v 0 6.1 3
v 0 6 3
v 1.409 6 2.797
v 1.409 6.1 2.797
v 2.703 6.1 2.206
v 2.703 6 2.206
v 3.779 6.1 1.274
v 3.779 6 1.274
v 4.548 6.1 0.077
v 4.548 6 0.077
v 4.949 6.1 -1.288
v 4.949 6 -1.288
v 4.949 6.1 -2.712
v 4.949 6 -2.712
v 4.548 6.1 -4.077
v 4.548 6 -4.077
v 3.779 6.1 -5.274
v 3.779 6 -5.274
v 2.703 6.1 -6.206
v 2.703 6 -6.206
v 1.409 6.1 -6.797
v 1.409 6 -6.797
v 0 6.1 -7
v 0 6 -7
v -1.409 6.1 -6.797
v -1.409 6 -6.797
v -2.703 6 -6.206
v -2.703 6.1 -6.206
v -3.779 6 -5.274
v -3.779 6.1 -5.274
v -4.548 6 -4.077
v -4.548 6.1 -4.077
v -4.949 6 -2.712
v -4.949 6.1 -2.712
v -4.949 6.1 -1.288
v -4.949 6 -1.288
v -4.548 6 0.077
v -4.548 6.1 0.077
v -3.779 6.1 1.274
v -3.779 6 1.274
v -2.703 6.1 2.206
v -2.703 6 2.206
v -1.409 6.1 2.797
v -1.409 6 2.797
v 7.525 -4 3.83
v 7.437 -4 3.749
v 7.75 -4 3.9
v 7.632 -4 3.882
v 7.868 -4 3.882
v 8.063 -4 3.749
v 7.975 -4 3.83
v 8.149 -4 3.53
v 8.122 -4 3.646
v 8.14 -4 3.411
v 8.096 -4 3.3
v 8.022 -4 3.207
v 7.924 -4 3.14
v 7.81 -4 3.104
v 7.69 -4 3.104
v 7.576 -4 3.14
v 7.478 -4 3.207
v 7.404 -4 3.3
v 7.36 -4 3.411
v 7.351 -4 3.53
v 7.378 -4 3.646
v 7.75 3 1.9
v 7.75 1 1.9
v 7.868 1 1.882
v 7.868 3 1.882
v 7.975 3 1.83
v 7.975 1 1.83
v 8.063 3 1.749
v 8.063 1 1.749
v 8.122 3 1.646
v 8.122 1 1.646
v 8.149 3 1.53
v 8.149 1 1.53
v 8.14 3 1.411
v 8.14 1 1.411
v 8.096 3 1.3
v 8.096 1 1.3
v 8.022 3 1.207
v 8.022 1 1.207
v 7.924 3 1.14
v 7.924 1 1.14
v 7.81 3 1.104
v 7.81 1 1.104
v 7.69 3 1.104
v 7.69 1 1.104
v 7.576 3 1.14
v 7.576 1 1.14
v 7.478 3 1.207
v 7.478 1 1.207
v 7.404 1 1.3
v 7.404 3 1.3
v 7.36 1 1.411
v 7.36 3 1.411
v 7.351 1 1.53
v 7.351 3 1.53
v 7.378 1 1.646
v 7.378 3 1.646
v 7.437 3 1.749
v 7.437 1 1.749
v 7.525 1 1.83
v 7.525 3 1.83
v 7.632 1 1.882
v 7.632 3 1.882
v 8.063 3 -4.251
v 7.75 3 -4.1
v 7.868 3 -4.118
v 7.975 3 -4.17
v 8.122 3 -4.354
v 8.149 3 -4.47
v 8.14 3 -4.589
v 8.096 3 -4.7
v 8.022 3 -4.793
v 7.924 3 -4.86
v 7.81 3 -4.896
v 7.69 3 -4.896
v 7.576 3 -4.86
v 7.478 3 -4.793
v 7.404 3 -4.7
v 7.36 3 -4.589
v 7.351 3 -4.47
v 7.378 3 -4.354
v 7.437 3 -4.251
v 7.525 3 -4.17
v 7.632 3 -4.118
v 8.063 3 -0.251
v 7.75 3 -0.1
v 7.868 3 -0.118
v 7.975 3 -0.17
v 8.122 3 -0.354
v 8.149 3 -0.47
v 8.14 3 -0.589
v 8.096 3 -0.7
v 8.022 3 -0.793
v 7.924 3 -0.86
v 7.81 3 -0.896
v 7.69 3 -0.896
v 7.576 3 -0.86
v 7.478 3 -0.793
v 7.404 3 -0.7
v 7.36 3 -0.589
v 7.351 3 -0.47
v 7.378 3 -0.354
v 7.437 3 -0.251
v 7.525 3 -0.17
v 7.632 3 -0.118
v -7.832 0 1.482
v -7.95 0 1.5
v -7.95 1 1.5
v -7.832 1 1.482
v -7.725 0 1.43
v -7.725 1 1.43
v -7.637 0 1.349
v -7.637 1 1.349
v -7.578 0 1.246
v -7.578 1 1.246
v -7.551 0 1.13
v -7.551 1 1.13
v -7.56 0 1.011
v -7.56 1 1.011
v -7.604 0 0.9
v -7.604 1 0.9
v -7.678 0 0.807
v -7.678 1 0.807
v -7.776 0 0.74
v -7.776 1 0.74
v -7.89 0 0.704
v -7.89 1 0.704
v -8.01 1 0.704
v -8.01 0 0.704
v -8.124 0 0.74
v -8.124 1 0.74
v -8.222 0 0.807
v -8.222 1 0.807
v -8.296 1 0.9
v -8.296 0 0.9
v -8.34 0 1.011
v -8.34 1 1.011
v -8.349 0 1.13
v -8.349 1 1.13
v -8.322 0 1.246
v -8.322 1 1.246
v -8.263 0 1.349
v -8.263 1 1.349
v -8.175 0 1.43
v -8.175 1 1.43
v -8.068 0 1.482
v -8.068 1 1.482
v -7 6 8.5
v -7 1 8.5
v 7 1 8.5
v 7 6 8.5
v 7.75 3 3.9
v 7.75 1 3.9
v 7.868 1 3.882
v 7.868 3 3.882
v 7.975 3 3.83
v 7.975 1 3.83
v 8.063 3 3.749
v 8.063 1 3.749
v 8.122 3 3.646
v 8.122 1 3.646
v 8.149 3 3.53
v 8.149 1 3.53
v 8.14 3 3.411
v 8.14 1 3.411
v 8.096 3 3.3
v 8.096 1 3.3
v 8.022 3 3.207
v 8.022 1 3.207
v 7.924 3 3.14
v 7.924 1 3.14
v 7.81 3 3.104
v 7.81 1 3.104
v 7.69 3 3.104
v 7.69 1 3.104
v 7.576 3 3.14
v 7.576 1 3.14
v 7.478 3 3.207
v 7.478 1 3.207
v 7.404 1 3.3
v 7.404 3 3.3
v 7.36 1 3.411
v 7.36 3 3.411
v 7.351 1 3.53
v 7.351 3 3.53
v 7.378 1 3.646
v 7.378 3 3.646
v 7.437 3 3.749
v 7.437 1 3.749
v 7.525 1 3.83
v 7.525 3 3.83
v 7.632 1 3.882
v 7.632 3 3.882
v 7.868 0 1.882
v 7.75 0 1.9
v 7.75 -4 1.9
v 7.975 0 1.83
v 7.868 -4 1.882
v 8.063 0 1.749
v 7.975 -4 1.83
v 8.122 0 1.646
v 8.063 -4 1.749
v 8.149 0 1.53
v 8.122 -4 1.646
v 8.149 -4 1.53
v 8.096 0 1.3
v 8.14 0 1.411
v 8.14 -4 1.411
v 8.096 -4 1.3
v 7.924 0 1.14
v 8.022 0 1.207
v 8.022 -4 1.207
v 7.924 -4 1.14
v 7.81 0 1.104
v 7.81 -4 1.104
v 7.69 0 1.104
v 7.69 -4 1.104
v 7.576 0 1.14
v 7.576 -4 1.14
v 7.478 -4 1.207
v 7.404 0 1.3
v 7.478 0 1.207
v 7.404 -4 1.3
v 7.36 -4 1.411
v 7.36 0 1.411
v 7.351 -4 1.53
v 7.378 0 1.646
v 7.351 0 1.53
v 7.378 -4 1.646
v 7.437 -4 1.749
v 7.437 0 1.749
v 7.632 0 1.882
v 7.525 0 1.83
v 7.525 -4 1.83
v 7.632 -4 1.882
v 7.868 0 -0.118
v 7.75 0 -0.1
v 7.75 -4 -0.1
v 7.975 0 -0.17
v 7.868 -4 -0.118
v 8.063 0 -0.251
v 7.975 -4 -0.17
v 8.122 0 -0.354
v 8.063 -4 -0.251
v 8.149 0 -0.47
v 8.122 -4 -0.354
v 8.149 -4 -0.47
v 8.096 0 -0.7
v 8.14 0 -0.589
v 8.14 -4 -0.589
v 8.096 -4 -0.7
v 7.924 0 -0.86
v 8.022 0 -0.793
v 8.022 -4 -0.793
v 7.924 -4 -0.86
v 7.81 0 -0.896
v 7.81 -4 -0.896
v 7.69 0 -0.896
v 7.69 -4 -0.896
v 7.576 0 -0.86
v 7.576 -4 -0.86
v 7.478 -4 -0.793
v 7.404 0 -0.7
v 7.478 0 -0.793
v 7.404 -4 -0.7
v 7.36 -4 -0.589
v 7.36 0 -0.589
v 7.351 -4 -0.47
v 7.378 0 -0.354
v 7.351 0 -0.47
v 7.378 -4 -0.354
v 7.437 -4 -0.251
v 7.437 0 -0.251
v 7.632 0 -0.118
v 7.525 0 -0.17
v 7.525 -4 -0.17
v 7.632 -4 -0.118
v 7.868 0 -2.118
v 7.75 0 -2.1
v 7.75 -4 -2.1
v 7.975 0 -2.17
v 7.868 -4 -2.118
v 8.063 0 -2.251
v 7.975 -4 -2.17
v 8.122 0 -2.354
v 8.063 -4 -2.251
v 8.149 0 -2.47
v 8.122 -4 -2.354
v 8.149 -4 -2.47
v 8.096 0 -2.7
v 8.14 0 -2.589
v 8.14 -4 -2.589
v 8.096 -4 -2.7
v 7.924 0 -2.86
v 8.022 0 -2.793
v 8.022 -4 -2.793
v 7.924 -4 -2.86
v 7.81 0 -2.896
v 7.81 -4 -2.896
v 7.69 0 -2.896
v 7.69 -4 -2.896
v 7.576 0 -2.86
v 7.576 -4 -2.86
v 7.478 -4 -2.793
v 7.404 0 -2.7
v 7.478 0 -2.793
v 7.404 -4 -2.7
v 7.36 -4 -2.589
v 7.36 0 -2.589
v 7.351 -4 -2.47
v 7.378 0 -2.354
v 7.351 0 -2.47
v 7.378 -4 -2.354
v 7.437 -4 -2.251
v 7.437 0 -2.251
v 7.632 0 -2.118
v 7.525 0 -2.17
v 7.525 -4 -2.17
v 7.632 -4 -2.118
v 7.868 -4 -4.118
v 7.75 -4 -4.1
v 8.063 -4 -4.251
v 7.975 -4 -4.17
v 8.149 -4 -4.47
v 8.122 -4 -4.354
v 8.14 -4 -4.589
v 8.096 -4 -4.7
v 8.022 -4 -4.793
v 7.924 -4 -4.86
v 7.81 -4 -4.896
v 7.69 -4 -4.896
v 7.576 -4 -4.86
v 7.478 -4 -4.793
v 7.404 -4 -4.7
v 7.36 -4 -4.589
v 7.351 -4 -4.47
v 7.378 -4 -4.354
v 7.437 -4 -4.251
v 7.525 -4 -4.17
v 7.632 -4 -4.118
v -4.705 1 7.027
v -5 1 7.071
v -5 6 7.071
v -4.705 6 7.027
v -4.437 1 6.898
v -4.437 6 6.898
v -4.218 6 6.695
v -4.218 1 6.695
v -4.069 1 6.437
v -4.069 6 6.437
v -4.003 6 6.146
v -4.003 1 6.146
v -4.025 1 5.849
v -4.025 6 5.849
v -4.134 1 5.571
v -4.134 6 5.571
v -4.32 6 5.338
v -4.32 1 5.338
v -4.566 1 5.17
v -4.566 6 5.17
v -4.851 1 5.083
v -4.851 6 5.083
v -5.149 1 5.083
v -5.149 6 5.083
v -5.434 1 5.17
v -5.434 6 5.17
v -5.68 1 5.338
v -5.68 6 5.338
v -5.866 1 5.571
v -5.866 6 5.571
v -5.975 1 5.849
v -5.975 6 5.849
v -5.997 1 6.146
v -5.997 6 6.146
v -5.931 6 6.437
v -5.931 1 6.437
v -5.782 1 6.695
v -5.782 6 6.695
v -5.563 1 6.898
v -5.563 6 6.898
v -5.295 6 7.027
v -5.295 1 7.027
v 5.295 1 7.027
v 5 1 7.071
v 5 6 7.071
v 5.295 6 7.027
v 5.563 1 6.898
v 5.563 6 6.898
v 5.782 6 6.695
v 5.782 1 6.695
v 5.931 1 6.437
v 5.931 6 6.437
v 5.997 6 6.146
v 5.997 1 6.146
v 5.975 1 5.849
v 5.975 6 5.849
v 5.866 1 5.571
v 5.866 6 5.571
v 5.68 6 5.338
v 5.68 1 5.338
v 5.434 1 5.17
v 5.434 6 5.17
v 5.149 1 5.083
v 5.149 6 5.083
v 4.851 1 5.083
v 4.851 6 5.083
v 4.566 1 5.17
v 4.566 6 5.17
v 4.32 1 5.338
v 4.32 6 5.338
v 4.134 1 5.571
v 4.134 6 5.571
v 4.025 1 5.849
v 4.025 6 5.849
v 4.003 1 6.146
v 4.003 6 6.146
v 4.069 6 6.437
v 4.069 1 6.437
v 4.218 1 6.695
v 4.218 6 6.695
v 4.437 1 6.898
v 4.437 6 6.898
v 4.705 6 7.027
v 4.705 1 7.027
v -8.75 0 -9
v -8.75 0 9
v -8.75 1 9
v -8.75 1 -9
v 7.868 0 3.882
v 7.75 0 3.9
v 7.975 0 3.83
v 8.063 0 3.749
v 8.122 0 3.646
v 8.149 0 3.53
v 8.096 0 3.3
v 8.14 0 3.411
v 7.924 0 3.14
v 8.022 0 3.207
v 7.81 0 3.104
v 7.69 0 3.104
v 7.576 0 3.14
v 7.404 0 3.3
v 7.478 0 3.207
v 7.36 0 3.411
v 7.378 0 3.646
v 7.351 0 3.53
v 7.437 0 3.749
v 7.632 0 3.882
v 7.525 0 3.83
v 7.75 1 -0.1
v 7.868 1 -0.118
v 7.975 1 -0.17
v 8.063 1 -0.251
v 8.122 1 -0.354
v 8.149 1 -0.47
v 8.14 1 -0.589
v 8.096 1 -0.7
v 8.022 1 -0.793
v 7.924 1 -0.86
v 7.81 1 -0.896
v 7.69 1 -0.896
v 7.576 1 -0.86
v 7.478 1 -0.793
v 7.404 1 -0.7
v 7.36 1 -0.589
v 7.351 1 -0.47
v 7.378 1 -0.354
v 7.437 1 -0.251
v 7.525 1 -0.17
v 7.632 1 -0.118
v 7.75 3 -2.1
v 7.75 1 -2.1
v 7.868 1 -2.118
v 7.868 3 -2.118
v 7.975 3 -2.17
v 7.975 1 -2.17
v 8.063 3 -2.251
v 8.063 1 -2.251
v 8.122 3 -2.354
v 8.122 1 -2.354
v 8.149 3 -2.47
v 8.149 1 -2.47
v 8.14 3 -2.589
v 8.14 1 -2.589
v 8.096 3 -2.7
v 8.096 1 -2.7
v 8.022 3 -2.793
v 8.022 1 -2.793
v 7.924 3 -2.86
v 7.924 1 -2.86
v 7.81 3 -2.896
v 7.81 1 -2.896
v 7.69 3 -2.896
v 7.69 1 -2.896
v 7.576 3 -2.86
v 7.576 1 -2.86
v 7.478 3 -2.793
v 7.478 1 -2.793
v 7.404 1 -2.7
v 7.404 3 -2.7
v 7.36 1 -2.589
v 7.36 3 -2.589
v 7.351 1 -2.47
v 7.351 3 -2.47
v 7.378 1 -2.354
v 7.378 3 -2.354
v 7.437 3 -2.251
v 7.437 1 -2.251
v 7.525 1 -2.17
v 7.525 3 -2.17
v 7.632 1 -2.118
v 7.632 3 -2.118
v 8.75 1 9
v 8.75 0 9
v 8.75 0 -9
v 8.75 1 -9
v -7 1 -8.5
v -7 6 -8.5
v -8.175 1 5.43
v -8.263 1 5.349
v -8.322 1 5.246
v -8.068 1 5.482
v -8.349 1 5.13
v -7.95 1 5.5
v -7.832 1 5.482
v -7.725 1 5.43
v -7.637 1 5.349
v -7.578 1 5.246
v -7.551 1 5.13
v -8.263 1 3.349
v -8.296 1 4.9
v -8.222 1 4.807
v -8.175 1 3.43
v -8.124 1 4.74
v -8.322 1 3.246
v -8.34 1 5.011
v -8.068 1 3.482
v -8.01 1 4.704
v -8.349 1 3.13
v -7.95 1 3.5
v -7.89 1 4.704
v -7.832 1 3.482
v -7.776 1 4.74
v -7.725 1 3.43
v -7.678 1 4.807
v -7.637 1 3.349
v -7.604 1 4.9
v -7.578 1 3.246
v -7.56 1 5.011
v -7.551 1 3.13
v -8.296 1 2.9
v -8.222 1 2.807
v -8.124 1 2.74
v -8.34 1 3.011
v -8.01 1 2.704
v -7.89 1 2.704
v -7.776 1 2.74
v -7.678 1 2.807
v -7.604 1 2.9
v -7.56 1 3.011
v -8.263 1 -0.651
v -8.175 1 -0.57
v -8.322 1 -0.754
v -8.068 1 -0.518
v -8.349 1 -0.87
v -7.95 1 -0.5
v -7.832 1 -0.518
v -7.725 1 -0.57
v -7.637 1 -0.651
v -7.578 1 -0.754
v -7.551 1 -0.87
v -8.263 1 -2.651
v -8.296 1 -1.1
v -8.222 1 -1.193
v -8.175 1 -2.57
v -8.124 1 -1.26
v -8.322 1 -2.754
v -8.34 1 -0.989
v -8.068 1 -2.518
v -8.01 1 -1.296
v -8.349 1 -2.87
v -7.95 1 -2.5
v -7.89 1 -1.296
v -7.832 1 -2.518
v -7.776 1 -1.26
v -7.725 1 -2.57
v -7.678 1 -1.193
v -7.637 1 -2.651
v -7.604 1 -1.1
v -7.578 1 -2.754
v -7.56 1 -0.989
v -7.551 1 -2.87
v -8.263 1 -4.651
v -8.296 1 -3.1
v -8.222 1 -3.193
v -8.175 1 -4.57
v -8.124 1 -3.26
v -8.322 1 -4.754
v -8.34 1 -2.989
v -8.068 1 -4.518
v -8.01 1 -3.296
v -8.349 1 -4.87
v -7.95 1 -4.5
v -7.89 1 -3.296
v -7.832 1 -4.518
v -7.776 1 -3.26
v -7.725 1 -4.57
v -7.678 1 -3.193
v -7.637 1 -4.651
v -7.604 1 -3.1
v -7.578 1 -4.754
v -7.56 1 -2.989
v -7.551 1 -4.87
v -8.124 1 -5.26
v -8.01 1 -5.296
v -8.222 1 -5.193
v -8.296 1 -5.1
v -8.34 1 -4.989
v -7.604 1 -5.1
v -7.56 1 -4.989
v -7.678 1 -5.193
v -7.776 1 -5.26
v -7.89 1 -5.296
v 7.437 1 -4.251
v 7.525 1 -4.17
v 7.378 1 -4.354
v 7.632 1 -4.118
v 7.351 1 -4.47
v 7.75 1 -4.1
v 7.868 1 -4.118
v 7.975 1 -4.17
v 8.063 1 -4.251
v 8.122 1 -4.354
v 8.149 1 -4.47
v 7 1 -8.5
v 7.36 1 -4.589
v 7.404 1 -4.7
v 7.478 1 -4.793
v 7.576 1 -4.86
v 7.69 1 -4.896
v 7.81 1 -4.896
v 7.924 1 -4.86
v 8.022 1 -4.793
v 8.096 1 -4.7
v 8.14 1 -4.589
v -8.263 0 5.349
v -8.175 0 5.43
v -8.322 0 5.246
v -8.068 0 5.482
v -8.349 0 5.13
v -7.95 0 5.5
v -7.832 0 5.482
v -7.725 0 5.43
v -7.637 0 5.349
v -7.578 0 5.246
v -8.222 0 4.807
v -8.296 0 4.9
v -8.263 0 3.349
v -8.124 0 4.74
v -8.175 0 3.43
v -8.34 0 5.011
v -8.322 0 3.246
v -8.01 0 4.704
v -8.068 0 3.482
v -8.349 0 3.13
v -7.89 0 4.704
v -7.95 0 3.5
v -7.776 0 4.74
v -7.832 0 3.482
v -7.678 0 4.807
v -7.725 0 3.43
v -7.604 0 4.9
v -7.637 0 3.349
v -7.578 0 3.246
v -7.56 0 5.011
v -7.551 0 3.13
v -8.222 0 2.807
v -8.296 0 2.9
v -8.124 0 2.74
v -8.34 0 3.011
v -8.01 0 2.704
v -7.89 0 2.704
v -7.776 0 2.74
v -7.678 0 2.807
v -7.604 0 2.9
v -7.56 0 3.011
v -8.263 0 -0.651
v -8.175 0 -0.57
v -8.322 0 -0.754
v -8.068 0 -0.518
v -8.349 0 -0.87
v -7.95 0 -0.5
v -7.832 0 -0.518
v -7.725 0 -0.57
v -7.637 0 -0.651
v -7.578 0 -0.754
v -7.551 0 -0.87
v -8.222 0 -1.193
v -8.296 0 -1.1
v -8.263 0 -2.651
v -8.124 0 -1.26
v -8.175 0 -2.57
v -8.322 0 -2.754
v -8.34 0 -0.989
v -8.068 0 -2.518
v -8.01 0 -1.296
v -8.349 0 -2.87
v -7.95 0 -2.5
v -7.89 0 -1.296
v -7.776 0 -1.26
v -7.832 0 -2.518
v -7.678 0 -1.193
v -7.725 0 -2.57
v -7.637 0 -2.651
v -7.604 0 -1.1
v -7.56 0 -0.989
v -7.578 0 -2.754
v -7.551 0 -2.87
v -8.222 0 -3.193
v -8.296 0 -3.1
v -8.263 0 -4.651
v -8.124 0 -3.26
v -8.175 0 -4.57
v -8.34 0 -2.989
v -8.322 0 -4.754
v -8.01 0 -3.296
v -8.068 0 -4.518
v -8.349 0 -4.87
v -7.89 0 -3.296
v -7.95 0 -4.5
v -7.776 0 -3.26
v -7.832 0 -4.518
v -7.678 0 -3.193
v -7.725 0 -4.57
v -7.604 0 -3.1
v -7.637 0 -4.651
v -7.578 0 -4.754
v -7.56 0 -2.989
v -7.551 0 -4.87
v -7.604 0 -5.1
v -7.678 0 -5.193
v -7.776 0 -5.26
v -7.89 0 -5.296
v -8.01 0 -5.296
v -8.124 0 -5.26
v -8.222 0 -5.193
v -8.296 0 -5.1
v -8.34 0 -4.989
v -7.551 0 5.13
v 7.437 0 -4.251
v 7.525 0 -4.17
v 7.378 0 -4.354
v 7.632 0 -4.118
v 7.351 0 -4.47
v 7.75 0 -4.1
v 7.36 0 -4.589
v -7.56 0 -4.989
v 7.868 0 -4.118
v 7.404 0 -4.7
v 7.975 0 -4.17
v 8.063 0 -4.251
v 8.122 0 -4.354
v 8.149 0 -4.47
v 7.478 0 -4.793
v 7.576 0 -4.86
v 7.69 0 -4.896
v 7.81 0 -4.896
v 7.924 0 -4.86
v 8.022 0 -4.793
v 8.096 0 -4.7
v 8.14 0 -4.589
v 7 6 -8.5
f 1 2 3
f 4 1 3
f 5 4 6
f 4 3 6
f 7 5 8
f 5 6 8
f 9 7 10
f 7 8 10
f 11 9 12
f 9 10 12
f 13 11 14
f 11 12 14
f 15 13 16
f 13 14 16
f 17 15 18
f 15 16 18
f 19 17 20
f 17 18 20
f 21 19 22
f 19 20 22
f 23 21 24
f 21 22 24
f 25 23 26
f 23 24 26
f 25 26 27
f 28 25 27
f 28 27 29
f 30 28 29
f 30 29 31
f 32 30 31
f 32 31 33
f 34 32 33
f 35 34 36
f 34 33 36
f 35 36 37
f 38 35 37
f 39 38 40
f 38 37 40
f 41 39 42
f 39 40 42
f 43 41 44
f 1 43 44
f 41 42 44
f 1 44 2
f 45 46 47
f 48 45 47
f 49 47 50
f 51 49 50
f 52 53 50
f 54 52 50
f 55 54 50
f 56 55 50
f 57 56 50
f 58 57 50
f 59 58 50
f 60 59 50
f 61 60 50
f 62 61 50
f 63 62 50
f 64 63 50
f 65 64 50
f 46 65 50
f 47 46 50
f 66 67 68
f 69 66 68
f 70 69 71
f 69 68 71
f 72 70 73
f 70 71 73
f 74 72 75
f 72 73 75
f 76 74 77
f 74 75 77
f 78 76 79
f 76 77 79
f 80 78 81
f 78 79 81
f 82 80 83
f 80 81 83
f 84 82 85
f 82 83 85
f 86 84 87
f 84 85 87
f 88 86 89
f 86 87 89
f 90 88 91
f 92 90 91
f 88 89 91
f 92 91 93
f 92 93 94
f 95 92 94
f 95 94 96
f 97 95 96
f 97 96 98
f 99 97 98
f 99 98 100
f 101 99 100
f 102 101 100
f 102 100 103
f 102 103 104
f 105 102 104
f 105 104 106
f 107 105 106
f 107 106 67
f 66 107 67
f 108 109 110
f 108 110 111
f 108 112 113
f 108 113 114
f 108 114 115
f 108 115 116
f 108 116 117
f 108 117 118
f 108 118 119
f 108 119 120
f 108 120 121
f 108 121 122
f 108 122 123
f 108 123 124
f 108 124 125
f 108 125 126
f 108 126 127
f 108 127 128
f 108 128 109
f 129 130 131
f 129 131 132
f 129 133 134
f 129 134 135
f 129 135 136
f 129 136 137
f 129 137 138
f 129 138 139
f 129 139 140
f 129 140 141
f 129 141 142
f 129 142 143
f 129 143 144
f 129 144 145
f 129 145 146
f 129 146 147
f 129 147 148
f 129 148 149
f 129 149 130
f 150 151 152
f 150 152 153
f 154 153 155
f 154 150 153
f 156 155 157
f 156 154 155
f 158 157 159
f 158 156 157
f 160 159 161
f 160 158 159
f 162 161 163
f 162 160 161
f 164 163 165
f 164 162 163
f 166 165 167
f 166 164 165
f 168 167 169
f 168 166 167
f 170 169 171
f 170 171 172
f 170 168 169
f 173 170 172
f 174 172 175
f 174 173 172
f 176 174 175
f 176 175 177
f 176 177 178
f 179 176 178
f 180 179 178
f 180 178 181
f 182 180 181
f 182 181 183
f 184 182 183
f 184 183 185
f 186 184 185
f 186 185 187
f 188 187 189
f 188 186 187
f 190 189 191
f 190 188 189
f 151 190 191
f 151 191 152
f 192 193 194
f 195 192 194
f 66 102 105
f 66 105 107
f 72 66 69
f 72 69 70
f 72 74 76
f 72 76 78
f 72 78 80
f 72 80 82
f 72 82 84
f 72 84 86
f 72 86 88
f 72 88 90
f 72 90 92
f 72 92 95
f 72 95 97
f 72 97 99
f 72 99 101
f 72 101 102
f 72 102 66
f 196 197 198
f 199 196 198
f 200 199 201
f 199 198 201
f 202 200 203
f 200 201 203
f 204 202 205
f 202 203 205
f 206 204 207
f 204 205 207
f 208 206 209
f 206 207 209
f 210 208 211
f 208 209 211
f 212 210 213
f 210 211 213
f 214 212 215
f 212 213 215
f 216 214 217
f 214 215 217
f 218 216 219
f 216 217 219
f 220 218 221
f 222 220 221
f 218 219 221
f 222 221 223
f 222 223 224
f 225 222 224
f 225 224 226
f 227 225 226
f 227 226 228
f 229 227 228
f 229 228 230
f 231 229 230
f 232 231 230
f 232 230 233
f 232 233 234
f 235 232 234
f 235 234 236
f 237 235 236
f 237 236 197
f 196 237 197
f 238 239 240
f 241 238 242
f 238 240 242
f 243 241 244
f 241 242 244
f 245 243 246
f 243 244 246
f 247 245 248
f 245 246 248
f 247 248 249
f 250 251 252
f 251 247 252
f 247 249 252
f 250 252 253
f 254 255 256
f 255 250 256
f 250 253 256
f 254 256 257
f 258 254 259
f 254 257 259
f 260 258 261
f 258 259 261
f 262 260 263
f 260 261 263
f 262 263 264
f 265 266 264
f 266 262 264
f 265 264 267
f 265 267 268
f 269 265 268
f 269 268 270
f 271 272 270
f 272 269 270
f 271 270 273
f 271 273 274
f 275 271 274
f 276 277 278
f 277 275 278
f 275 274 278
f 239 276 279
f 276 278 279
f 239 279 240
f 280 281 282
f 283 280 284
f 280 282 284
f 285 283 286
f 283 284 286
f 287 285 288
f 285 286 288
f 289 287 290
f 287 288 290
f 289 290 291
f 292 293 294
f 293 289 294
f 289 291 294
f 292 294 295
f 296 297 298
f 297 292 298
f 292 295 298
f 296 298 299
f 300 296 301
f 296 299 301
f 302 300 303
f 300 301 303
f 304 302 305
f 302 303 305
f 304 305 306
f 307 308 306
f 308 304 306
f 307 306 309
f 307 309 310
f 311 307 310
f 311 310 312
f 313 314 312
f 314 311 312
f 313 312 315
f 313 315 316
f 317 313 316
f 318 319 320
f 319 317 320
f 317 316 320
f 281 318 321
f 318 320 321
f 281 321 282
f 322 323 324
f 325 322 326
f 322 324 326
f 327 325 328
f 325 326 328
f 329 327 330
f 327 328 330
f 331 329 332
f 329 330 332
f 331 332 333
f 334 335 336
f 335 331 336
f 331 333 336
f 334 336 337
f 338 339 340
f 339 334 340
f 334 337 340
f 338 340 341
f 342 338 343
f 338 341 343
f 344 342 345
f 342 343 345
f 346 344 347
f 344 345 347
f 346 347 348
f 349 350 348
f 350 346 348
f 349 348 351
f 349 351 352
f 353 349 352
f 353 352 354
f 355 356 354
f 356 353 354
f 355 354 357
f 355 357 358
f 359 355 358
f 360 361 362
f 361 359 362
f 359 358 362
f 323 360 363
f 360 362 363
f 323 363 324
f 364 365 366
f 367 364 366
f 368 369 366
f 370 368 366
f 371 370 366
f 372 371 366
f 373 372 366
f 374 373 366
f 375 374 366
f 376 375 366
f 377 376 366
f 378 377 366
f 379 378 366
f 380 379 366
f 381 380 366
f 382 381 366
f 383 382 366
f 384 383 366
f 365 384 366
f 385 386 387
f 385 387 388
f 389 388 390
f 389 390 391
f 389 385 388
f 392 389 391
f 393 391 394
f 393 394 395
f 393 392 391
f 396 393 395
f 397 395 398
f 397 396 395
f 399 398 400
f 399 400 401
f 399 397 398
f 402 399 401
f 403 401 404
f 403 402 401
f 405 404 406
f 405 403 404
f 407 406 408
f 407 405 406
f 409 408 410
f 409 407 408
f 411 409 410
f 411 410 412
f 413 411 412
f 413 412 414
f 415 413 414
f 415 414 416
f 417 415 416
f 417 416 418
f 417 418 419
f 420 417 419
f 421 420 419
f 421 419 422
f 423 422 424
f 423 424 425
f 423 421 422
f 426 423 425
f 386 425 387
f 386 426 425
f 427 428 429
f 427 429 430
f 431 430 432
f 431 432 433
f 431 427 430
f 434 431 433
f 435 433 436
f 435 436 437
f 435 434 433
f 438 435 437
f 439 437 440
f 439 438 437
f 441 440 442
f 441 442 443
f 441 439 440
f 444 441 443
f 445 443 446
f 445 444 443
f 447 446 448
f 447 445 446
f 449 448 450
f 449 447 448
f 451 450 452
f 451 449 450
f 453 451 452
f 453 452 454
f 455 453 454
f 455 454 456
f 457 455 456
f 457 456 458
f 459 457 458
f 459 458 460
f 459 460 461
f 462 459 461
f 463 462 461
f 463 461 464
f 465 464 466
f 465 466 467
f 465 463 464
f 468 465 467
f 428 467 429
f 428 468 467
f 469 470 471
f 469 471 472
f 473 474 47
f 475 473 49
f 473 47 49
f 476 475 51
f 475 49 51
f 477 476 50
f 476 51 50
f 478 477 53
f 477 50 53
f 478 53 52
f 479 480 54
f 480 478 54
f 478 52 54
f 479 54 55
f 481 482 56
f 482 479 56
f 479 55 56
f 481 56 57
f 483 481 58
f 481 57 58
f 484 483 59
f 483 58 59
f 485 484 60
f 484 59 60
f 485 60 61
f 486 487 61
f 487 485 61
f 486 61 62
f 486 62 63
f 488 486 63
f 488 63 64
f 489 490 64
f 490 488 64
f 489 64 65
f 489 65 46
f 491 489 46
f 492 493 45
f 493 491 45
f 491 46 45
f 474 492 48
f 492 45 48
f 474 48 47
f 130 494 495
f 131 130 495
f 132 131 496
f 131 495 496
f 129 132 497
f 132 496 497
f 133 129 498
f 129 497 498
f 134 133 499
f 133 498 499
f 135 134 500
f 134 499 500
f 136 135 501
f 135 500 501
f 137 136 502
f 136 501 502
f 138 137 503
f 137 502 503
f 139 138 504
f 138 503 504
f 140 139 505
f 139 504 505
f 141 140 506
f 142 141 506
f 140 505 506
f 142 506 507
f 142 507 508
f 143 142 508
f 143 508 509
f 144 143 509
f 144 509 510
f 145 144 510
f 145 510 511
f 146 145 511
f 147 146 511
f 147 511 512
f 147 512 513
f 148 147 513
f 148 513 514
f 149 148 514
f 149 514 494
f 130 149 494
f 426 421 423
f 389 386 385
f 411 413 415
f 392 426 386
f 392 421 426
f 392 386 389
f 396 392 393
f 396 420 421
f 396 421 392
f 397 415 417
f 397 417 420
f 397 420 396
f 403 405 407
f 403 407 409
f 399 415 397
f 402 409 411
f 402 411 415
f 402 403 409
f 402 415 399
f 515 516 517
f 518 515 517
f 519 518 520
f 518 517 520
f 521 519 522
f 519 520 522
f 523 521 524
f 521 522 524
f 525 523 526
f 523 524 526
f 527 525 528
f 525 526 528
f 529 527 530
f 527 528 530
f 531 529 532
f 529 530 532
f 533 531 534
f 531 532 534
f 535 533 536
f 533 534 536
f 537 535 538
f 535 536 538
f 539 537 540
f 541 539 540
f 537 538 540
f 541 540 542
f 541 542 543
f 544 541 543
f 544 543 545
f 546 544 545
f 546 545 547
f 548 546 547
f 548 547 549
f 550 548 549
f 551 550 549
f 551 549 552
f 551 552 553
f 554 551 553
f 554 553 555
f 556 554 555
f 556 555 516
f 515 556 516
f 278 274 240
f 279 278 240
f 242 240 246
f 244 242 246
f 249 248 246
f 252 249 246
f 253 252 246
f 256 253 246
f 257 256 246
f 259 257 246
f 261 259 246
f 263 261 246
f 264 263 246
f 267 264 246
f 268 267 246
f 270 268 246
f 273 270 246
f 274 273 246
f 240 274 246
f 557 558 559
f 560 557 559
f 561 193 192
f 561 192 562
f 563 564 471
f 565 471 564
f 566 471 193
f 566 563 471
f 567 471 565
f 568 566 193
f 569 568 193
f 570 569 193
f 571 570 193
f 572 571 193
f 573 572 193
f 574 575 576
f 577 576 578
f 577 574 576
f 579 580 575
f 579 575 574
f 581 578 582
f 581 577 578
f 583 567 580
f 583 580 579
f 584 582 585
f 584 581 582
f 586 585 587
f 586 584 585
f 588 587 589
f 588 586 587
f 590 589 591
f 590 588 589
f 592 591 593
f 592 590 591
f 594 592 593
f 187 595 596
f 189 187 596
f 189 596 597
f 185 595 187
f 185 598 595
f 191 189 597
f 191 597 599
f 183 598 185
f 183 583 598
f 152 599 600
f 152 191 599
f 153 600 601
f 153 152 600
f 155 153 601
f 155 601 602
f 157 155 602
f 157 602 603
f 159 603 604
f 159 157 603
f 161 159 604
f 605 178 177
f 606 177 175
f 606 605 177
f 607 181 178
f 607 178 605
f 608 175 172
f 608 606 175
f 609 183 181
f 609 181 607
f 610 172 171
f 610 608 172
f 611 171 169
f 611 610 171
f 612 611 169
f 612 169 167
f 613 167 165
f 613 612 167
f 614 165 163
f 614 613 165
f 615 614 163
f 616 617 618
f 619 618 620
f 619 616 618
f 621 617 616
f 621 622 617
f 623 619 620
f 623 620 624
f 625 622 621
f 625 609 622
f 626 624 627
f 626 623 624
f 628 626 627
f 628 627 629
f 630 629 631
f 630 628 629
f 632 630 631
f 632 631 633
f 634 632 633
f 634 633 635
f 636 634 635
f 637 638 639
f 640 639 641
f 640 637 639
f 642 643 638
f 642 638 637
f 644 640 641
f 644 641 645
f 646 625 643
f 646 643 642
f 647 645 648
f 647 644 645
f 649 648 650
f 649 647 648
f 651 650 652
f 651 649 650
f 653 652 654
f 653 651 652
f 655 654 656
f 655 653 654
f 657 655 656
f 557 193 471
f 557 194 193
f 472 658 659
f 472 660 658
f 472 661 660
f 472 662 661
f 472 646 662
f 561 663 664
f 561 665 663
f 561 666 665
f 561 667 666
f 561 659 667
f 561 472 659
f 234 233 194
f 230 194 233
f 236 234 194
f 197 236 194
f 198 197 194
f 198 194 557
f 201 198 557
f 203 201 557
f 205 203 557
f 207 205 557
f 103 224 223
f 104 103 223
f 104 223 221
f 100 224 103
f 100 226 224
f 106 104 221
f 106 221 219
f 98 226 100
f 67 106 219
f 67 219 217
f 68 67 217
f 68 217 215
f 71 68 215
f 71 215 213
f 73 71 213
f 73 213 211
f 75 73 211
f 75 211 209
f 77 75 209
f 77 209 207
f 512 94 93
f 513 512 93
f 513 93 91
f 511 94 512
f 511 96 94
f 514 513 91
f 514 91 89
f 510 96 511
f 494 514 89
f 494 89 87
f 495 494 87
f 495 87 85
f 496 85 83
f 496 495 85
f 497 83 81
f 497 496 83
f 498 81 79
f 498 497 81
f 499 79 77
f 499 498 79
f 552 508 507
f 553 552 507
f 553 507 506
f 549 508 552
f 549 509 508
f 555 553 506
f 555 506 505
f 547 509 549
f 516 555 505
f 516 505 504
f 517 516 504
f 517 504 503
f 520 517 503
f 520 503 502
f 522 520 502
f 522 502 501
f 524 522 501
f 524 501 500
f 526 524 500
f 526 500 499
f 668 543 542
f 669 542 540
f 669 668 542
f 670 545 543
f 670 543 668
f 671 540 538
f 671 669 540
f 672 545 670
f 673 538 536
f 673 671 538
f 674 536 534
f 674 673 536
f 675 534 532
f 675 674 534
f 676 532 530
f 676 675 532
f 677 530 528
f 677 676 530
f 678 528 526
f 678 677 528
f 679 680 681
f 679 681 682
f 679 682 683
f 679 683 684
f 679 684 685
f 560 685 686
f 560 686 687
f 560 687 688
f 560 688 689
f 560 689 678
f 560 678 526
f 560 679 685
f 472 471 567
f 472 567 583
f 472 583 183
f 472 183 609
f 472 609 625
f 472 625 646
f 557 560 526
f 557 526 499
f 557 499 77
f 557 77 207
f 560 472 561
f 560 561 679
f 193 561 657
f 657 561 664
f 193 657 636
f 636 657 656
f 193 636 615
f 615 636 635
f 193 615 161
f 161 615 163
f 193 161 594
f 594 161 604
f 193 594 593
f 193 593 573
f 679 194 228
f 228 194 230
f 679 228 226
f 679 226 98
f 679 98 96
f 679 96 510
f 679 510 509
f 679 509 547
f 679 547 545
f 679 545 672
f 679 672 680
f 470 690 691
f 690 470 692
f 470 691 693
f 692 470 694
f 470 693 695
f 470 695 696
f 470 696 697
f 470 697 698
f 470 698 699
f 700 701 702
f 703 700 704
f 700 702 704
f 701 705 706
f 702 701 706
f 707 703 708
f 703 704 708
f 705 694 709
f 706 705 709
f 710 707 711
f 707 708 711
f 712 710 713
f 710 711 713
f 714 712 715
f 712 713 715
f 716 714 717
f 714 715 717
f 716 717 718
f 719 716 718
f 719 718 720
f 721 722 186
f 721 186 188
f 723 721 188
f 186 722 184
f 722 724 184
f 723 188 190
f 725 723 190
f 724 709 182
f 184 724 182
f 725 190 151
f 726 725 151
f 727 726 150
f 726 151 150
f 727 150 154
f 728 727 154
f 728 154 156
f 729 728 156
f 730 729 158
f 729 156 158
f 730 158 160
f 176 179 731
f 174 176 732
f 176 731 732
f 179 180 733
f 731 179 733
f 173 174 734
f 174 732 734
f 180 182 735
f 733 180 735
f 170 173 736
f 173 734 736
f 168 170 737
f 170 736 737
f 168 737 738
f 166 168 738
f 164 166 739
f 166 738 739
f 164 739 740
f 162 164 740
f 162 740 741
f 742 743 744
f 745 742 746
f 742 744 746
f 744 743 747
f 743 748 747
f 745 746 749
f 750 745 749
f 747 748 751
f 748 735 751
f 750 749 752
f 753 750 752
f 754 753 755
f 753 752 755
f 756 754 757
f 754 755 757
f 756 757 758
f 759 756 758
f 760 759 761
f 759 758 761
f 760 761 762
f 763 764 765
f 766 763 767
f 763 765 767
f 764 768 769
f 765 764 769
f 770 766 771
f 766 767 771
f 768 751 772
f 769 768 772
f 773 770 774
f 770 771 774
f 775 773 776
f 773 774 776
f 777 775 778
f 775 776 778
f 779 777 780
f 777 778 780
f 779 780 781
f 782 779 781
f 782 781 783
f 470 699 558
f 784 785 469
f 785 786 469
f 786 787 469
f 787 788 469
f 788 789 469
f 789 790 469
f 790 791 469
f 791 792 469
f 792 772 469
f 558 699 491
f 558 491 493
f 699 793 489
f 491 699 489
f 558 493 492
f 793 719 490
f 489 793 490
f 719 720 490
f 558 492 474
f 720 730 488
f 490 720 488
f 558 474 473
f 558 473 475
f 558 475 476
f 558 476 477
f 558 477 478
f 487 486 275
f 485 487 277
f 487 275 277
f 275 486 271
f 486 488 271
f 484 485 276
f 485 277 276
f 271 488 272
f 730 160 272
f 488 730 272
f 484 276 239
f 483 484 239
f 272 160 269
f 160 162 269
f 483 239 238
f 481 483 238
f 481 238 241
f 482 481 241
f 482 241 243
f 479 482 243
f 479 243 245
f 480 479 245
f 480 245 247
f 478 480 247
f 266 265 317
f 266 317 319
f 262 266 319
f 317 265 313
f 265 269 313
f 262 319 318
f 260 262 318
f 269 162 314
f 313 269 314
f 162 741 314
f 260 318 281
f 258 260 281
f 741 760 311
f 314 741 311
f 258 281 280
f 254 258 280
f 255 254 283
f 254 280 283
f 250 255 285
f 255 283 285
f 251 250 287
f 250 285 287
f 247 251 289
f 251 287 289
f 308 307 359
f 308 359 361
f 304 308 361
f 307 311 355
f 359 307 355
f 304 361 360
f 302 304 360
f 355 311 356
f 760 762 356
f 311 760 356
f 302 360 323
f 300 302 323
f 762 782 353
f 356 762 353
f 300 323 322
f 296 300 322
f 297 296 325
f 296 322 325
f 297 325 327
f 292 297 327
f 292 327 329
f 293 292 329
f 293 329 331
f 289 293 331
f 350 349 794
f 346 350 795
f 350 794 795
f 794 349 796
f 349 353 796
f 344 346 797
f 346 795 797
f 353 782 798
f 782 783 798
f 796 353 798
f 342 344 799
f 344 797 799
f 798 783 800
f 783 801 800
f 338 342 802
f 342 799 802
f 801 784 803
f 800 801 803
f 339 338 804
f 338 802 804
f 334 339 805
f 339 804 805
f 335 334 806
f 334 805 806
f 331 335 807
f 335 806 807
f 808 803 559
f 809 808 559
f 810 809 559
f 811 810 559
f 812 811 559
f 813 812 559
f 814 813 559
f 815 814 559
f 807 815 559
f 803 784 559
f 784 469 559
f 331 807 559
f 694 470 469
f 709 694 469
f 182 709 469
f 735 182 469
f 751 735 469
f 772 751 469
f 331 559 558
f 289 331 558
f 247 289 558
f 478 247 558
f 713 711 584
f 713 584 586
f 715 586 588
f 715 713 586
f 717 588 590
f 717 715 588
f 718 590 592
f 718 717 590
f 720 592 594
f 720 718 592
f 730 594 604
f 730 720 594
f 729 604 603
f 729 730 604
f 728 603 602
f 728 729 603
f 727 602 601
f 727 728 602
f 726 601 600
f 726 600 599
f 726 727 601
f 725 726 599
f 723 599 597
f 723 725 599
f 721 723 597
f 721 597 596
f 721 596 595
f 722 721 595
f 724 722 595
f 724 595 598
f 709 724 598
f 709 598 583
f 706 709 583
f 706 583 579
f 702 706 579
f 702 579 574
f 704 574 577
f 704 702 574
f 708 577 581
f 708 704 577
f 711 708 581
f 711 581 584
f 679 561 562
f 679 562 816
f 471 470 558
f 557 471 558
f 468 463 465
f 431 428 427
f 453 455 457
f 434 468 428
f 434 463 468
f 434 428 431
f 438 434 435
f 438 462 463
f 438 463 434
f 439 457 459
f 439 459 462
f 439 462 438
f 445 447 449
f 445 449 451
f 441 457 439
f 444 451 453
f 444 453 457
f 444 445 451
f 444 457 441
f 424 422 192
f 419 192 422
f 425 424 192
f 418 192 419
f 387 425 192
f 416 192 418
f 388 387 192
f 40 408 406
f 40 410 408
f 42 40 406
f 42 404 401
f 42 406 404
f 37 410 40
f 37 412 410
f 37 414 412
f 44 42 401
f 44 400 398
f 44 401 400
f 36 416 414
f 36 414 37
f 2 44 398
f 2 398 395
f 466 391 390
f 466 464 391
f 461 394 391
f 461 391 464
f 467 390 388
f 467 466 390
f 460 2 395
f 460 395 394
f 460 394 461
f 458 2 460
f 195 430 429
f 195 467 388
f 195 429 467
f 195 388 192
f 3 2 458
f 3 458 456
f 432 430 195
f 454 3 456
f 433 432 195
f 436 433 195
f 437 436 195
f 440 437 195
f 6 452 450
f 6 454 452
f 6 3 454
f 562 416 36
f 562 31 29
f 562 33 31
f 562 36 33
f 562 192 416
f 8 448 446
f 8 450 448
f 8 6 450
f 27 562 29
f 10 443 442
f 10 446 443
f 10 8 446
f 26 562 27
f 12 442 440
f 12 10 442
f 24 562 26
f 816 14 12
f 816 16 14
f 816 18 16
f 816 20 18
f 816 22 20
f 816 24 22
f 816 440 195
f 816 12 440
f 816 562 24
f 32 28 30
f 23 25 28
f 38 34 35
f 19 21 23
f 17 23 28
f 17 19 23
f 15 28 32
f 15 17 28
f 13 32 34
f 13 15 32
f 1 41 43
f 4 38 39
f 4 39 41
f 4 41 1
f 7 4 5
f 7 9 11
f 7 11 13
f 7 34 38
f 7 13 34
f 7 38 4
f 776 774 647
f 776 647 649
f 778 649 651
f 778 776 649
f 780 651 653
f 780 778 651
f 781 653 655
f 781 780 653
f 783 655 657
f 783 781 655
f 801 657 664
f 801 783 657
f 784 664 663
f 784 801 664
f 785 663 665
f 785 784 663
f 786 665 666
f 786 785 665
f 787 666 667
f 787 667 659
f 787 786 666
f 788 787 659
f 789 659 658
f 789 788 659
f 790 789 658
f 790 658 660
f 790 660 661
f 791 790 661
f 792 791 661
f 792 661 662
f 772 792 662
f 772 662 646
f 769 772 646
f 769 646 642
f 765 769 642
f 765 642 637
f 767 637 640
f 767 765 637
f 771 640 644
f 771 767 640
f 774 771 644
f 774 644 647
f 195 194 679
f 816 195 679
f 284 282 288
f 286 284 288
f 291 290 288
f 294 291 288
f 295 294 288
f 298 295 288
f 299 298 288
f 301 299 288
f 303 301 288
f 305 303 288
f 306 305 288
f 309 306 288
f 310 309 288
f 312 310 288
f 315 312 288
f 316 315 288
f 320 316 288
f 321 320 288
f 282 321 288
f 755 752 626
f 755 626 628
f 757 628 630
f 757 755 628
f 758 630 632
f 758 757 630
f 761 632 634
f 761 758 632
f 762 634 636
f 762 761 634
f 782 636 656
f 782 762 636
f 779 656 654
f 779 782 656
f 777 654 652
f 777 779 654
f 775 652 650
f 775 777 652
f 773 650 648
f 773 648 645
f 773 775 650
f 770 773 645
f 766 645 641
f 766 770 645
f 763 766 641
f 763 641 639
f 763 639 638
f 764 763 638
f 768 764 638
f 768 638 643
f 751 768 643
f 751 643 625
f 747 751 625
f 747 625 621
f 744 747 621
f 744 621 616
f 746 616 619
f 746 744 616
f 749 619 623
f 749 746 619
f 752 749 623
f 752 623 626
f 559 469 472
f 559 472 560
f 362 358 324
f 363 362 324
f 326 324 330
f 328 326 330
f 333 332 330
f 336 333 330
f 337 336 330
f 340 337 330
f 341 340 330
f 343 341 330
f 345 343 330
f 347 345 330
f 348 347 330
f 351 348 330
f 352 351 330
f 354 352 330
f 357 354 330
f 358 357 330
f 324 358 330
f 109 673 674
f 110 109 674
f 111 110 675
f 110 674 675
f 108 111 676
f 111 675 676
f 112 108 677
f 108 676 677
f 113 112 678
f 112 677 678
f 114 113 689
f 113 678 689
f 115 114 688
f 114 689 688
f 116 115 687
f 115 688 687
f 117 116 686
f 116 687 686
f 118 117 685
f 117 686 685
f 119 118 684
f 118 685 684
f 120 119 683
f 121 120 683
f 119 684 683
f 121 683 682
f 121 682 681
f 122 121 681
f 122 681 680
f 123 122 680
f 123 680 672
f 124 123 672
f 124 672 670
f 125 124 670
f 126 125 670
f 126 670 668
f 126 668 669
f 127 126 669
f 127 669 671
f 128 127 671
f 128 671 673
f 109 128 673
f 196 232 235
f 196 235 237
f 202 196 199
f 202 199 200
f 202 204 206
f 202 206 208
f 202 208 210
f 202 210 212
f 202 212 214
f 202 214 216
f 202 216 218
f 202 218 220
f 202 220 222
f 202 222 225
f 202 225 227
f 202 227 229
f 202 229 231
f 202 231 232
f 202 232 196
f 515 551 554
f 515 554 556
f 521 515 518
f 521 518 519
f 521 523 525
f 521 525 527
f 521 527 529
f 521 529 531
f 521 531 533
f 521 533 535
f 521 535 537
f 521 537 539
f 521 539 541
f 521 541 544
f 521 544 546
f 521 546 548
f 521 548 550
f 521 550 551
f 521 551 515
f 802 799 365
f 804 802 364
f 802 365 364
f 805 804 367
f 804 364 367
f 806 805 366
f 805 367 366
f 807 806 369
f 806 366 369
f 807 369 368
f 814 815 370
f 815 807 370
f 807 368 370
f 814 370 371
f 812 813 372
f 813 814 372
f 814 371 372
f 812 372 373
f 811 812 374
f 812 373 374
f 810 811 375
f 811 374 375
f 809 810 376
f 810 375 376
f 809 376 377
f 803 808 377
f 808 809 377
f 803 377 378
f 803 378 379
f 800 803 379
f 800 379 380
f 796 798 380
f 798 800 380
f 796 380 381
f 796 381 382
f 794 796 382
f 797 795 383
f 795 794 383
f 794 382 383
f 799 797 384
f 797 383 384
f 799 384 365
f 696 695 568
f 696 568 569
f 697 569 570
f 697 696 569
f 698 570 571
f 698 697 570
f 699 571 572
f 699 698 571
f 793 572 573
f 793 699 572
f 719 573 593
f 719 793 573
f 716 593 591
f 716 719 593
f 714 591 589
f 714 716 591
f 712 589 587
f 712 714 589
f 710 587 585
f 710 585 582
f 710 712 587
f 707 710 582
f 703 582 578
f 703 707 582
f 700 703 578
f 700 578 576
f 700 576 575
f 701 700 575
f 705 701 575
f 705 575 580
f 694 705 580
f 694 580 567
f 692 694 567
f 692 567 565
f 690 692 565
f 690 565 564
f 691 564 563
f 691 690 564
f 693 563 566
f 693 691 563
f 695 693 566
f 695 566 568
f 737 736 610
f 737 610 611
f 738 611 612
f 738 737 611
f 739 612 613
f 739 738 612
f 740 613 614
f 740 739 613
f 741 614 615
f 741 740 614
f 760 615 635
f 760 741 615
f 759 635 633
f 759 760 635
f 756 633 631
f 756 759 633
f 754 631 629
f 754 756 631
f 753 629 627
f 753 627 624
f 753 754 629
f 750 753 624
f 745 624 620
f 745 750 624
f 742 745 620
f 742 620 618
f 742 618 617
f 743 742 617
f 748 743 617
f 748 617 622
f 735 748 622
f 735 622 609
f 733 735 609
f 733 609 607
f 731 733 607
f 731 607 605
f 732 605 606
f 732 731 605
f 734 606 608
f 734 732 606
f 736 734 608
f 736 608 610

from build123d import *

# Parameters (mm, degrees)
SKETCH1_W                = 17.5
SKETCH1_H                = 18
SKETCH1_R                = 0.4
BOSS_EXTRUDE1_DEPTH      = 1
SKETCH3_W                = 14
SKETCH3_H                = 17
SKETCH3_R                = 1
BOSS_EXTRUDE2_DEPTH      = 5
BOSS_EXTRUDE3_DEPTH      = 2
BOSS_EXTRUDE3_DEPTH_BACK = 5
SKETCH4_R                = 0.4
SKETCH5_R                = 5
BOSS_EXTRUDE4_DEPTH      = 0.1


with BuildPart() as part:
    # Sketch1 → Boss-Extrude1 (new body)
    with BuildSketch(Plane(origin=(0, 0, 0), x_dir=(1, 0, 0), z_dir=(0, 1, 0))):
        Rectangle(SKETCH1_W, SKETCH1_H)
        with Locations(Location((-7.95, -5.1, 0), (0, 0, 270))):
            Circle(SKETCH1_R, mode=Mode.SUBTRACT)
        with Locations(Location((-7.95, -3.1, 0), (0, 0, 270))):
            Circle(SKETCH1_R, mode=Mode.SUBTRACT)
        with Locations(Location((-7.95, -1.1, 0), (0, 0, 270))):
            Circle(SKETCH1_R, mode=Mode.SUBTRACT)
        with Locations(Location((-7.95, 0.9, 0), (0, 0, 270))):
            Circle(SKETCH1_R, mode=Mode.SUBTRACT)
        with Locations(Location((-7.95, 2.9, 0), (0, 0, 270))):
            Circle(SKETCH1_R, mode=Mode.SUBTRACT)
        with Locations(Location((-7.95, 4.9, 0), (0, 0, 270))):
            Circle(SKETCH1_R, mode=Mode.SUBTRACT)
    extrude(amount=BOSS_EXTRUDE1_DEPTH)

    # Sketch3 → Boss-Extrude2 (add)
    with BuildSketch(Plane(origin=(0, 1, 0), x_dir=(1, 0, 0), z_dir=(0, 1, 0))):
        Rectangle(SKETCH3_W, SKETCH3_H)
        with Locations(Location((-5, -6.071428571, 0), (0, 0, 270))):
            Circle(SKETCH3_R, mode=Mode.SUBTRACT)
        with Locations(Location((5, -6.071428571, 0), (0, 0, 270))):
            Circle(SKETCH3_R, mode=Mode.SUBTRACT)
    extrude(amount=BOSS_EXTRUDE2_DEPTH)

    # Sketch4 → Boss-Extrude3 (add, two sides: drawn at the far end of the back side and taken through both)
    with BuildSketch(Plane(origin=(0, 1, 0), x_dir=(1, 0, 0), z_dir=(0, 1, 0)).offset(-BOSS_EXTRUDE3_DEPTH_BACK)):
        with Locations(Location((7.75, 4.5, 0), (0, 0, 270))):
            Circle(SKETCH4_R)
        with Locations(Location((7.75, 2.5, 0), (0, 0, 270))):
            Circle(SKETCH4_R)
        with Locations(Location((7.75, 0.5, 0), (0, 0, 270))):
            Circle(SKETCH4_R)
        with Locations(Location((7.75, -1.5, 0), (0, 0, 270))):
            Circle(SKETCH4_R)
        with Locations(Location((7.75, -3.5, 0), (0, 0, 270))):
            Circle(SKETCH4_R)
    extrude(amount=BOSS_EXTRUDE3_DEPTH + BOSS_EXTRUDE3_DEPTH_BACK)

    # Sketch5 → Boss-Extrude4 (add)
    with BuildSketch(Plane(origin=(0, 6, 0), x_dir=(1, 0, 0), z_dir=(0, 1, 0))):
        with Locations(Location((0, 2, 0), (0, 0, 270))):
            Circle(SKETCH5_R)
    extrude(amount=BOSS_EXTRUDE4_DEPTH)


solid = part.part
